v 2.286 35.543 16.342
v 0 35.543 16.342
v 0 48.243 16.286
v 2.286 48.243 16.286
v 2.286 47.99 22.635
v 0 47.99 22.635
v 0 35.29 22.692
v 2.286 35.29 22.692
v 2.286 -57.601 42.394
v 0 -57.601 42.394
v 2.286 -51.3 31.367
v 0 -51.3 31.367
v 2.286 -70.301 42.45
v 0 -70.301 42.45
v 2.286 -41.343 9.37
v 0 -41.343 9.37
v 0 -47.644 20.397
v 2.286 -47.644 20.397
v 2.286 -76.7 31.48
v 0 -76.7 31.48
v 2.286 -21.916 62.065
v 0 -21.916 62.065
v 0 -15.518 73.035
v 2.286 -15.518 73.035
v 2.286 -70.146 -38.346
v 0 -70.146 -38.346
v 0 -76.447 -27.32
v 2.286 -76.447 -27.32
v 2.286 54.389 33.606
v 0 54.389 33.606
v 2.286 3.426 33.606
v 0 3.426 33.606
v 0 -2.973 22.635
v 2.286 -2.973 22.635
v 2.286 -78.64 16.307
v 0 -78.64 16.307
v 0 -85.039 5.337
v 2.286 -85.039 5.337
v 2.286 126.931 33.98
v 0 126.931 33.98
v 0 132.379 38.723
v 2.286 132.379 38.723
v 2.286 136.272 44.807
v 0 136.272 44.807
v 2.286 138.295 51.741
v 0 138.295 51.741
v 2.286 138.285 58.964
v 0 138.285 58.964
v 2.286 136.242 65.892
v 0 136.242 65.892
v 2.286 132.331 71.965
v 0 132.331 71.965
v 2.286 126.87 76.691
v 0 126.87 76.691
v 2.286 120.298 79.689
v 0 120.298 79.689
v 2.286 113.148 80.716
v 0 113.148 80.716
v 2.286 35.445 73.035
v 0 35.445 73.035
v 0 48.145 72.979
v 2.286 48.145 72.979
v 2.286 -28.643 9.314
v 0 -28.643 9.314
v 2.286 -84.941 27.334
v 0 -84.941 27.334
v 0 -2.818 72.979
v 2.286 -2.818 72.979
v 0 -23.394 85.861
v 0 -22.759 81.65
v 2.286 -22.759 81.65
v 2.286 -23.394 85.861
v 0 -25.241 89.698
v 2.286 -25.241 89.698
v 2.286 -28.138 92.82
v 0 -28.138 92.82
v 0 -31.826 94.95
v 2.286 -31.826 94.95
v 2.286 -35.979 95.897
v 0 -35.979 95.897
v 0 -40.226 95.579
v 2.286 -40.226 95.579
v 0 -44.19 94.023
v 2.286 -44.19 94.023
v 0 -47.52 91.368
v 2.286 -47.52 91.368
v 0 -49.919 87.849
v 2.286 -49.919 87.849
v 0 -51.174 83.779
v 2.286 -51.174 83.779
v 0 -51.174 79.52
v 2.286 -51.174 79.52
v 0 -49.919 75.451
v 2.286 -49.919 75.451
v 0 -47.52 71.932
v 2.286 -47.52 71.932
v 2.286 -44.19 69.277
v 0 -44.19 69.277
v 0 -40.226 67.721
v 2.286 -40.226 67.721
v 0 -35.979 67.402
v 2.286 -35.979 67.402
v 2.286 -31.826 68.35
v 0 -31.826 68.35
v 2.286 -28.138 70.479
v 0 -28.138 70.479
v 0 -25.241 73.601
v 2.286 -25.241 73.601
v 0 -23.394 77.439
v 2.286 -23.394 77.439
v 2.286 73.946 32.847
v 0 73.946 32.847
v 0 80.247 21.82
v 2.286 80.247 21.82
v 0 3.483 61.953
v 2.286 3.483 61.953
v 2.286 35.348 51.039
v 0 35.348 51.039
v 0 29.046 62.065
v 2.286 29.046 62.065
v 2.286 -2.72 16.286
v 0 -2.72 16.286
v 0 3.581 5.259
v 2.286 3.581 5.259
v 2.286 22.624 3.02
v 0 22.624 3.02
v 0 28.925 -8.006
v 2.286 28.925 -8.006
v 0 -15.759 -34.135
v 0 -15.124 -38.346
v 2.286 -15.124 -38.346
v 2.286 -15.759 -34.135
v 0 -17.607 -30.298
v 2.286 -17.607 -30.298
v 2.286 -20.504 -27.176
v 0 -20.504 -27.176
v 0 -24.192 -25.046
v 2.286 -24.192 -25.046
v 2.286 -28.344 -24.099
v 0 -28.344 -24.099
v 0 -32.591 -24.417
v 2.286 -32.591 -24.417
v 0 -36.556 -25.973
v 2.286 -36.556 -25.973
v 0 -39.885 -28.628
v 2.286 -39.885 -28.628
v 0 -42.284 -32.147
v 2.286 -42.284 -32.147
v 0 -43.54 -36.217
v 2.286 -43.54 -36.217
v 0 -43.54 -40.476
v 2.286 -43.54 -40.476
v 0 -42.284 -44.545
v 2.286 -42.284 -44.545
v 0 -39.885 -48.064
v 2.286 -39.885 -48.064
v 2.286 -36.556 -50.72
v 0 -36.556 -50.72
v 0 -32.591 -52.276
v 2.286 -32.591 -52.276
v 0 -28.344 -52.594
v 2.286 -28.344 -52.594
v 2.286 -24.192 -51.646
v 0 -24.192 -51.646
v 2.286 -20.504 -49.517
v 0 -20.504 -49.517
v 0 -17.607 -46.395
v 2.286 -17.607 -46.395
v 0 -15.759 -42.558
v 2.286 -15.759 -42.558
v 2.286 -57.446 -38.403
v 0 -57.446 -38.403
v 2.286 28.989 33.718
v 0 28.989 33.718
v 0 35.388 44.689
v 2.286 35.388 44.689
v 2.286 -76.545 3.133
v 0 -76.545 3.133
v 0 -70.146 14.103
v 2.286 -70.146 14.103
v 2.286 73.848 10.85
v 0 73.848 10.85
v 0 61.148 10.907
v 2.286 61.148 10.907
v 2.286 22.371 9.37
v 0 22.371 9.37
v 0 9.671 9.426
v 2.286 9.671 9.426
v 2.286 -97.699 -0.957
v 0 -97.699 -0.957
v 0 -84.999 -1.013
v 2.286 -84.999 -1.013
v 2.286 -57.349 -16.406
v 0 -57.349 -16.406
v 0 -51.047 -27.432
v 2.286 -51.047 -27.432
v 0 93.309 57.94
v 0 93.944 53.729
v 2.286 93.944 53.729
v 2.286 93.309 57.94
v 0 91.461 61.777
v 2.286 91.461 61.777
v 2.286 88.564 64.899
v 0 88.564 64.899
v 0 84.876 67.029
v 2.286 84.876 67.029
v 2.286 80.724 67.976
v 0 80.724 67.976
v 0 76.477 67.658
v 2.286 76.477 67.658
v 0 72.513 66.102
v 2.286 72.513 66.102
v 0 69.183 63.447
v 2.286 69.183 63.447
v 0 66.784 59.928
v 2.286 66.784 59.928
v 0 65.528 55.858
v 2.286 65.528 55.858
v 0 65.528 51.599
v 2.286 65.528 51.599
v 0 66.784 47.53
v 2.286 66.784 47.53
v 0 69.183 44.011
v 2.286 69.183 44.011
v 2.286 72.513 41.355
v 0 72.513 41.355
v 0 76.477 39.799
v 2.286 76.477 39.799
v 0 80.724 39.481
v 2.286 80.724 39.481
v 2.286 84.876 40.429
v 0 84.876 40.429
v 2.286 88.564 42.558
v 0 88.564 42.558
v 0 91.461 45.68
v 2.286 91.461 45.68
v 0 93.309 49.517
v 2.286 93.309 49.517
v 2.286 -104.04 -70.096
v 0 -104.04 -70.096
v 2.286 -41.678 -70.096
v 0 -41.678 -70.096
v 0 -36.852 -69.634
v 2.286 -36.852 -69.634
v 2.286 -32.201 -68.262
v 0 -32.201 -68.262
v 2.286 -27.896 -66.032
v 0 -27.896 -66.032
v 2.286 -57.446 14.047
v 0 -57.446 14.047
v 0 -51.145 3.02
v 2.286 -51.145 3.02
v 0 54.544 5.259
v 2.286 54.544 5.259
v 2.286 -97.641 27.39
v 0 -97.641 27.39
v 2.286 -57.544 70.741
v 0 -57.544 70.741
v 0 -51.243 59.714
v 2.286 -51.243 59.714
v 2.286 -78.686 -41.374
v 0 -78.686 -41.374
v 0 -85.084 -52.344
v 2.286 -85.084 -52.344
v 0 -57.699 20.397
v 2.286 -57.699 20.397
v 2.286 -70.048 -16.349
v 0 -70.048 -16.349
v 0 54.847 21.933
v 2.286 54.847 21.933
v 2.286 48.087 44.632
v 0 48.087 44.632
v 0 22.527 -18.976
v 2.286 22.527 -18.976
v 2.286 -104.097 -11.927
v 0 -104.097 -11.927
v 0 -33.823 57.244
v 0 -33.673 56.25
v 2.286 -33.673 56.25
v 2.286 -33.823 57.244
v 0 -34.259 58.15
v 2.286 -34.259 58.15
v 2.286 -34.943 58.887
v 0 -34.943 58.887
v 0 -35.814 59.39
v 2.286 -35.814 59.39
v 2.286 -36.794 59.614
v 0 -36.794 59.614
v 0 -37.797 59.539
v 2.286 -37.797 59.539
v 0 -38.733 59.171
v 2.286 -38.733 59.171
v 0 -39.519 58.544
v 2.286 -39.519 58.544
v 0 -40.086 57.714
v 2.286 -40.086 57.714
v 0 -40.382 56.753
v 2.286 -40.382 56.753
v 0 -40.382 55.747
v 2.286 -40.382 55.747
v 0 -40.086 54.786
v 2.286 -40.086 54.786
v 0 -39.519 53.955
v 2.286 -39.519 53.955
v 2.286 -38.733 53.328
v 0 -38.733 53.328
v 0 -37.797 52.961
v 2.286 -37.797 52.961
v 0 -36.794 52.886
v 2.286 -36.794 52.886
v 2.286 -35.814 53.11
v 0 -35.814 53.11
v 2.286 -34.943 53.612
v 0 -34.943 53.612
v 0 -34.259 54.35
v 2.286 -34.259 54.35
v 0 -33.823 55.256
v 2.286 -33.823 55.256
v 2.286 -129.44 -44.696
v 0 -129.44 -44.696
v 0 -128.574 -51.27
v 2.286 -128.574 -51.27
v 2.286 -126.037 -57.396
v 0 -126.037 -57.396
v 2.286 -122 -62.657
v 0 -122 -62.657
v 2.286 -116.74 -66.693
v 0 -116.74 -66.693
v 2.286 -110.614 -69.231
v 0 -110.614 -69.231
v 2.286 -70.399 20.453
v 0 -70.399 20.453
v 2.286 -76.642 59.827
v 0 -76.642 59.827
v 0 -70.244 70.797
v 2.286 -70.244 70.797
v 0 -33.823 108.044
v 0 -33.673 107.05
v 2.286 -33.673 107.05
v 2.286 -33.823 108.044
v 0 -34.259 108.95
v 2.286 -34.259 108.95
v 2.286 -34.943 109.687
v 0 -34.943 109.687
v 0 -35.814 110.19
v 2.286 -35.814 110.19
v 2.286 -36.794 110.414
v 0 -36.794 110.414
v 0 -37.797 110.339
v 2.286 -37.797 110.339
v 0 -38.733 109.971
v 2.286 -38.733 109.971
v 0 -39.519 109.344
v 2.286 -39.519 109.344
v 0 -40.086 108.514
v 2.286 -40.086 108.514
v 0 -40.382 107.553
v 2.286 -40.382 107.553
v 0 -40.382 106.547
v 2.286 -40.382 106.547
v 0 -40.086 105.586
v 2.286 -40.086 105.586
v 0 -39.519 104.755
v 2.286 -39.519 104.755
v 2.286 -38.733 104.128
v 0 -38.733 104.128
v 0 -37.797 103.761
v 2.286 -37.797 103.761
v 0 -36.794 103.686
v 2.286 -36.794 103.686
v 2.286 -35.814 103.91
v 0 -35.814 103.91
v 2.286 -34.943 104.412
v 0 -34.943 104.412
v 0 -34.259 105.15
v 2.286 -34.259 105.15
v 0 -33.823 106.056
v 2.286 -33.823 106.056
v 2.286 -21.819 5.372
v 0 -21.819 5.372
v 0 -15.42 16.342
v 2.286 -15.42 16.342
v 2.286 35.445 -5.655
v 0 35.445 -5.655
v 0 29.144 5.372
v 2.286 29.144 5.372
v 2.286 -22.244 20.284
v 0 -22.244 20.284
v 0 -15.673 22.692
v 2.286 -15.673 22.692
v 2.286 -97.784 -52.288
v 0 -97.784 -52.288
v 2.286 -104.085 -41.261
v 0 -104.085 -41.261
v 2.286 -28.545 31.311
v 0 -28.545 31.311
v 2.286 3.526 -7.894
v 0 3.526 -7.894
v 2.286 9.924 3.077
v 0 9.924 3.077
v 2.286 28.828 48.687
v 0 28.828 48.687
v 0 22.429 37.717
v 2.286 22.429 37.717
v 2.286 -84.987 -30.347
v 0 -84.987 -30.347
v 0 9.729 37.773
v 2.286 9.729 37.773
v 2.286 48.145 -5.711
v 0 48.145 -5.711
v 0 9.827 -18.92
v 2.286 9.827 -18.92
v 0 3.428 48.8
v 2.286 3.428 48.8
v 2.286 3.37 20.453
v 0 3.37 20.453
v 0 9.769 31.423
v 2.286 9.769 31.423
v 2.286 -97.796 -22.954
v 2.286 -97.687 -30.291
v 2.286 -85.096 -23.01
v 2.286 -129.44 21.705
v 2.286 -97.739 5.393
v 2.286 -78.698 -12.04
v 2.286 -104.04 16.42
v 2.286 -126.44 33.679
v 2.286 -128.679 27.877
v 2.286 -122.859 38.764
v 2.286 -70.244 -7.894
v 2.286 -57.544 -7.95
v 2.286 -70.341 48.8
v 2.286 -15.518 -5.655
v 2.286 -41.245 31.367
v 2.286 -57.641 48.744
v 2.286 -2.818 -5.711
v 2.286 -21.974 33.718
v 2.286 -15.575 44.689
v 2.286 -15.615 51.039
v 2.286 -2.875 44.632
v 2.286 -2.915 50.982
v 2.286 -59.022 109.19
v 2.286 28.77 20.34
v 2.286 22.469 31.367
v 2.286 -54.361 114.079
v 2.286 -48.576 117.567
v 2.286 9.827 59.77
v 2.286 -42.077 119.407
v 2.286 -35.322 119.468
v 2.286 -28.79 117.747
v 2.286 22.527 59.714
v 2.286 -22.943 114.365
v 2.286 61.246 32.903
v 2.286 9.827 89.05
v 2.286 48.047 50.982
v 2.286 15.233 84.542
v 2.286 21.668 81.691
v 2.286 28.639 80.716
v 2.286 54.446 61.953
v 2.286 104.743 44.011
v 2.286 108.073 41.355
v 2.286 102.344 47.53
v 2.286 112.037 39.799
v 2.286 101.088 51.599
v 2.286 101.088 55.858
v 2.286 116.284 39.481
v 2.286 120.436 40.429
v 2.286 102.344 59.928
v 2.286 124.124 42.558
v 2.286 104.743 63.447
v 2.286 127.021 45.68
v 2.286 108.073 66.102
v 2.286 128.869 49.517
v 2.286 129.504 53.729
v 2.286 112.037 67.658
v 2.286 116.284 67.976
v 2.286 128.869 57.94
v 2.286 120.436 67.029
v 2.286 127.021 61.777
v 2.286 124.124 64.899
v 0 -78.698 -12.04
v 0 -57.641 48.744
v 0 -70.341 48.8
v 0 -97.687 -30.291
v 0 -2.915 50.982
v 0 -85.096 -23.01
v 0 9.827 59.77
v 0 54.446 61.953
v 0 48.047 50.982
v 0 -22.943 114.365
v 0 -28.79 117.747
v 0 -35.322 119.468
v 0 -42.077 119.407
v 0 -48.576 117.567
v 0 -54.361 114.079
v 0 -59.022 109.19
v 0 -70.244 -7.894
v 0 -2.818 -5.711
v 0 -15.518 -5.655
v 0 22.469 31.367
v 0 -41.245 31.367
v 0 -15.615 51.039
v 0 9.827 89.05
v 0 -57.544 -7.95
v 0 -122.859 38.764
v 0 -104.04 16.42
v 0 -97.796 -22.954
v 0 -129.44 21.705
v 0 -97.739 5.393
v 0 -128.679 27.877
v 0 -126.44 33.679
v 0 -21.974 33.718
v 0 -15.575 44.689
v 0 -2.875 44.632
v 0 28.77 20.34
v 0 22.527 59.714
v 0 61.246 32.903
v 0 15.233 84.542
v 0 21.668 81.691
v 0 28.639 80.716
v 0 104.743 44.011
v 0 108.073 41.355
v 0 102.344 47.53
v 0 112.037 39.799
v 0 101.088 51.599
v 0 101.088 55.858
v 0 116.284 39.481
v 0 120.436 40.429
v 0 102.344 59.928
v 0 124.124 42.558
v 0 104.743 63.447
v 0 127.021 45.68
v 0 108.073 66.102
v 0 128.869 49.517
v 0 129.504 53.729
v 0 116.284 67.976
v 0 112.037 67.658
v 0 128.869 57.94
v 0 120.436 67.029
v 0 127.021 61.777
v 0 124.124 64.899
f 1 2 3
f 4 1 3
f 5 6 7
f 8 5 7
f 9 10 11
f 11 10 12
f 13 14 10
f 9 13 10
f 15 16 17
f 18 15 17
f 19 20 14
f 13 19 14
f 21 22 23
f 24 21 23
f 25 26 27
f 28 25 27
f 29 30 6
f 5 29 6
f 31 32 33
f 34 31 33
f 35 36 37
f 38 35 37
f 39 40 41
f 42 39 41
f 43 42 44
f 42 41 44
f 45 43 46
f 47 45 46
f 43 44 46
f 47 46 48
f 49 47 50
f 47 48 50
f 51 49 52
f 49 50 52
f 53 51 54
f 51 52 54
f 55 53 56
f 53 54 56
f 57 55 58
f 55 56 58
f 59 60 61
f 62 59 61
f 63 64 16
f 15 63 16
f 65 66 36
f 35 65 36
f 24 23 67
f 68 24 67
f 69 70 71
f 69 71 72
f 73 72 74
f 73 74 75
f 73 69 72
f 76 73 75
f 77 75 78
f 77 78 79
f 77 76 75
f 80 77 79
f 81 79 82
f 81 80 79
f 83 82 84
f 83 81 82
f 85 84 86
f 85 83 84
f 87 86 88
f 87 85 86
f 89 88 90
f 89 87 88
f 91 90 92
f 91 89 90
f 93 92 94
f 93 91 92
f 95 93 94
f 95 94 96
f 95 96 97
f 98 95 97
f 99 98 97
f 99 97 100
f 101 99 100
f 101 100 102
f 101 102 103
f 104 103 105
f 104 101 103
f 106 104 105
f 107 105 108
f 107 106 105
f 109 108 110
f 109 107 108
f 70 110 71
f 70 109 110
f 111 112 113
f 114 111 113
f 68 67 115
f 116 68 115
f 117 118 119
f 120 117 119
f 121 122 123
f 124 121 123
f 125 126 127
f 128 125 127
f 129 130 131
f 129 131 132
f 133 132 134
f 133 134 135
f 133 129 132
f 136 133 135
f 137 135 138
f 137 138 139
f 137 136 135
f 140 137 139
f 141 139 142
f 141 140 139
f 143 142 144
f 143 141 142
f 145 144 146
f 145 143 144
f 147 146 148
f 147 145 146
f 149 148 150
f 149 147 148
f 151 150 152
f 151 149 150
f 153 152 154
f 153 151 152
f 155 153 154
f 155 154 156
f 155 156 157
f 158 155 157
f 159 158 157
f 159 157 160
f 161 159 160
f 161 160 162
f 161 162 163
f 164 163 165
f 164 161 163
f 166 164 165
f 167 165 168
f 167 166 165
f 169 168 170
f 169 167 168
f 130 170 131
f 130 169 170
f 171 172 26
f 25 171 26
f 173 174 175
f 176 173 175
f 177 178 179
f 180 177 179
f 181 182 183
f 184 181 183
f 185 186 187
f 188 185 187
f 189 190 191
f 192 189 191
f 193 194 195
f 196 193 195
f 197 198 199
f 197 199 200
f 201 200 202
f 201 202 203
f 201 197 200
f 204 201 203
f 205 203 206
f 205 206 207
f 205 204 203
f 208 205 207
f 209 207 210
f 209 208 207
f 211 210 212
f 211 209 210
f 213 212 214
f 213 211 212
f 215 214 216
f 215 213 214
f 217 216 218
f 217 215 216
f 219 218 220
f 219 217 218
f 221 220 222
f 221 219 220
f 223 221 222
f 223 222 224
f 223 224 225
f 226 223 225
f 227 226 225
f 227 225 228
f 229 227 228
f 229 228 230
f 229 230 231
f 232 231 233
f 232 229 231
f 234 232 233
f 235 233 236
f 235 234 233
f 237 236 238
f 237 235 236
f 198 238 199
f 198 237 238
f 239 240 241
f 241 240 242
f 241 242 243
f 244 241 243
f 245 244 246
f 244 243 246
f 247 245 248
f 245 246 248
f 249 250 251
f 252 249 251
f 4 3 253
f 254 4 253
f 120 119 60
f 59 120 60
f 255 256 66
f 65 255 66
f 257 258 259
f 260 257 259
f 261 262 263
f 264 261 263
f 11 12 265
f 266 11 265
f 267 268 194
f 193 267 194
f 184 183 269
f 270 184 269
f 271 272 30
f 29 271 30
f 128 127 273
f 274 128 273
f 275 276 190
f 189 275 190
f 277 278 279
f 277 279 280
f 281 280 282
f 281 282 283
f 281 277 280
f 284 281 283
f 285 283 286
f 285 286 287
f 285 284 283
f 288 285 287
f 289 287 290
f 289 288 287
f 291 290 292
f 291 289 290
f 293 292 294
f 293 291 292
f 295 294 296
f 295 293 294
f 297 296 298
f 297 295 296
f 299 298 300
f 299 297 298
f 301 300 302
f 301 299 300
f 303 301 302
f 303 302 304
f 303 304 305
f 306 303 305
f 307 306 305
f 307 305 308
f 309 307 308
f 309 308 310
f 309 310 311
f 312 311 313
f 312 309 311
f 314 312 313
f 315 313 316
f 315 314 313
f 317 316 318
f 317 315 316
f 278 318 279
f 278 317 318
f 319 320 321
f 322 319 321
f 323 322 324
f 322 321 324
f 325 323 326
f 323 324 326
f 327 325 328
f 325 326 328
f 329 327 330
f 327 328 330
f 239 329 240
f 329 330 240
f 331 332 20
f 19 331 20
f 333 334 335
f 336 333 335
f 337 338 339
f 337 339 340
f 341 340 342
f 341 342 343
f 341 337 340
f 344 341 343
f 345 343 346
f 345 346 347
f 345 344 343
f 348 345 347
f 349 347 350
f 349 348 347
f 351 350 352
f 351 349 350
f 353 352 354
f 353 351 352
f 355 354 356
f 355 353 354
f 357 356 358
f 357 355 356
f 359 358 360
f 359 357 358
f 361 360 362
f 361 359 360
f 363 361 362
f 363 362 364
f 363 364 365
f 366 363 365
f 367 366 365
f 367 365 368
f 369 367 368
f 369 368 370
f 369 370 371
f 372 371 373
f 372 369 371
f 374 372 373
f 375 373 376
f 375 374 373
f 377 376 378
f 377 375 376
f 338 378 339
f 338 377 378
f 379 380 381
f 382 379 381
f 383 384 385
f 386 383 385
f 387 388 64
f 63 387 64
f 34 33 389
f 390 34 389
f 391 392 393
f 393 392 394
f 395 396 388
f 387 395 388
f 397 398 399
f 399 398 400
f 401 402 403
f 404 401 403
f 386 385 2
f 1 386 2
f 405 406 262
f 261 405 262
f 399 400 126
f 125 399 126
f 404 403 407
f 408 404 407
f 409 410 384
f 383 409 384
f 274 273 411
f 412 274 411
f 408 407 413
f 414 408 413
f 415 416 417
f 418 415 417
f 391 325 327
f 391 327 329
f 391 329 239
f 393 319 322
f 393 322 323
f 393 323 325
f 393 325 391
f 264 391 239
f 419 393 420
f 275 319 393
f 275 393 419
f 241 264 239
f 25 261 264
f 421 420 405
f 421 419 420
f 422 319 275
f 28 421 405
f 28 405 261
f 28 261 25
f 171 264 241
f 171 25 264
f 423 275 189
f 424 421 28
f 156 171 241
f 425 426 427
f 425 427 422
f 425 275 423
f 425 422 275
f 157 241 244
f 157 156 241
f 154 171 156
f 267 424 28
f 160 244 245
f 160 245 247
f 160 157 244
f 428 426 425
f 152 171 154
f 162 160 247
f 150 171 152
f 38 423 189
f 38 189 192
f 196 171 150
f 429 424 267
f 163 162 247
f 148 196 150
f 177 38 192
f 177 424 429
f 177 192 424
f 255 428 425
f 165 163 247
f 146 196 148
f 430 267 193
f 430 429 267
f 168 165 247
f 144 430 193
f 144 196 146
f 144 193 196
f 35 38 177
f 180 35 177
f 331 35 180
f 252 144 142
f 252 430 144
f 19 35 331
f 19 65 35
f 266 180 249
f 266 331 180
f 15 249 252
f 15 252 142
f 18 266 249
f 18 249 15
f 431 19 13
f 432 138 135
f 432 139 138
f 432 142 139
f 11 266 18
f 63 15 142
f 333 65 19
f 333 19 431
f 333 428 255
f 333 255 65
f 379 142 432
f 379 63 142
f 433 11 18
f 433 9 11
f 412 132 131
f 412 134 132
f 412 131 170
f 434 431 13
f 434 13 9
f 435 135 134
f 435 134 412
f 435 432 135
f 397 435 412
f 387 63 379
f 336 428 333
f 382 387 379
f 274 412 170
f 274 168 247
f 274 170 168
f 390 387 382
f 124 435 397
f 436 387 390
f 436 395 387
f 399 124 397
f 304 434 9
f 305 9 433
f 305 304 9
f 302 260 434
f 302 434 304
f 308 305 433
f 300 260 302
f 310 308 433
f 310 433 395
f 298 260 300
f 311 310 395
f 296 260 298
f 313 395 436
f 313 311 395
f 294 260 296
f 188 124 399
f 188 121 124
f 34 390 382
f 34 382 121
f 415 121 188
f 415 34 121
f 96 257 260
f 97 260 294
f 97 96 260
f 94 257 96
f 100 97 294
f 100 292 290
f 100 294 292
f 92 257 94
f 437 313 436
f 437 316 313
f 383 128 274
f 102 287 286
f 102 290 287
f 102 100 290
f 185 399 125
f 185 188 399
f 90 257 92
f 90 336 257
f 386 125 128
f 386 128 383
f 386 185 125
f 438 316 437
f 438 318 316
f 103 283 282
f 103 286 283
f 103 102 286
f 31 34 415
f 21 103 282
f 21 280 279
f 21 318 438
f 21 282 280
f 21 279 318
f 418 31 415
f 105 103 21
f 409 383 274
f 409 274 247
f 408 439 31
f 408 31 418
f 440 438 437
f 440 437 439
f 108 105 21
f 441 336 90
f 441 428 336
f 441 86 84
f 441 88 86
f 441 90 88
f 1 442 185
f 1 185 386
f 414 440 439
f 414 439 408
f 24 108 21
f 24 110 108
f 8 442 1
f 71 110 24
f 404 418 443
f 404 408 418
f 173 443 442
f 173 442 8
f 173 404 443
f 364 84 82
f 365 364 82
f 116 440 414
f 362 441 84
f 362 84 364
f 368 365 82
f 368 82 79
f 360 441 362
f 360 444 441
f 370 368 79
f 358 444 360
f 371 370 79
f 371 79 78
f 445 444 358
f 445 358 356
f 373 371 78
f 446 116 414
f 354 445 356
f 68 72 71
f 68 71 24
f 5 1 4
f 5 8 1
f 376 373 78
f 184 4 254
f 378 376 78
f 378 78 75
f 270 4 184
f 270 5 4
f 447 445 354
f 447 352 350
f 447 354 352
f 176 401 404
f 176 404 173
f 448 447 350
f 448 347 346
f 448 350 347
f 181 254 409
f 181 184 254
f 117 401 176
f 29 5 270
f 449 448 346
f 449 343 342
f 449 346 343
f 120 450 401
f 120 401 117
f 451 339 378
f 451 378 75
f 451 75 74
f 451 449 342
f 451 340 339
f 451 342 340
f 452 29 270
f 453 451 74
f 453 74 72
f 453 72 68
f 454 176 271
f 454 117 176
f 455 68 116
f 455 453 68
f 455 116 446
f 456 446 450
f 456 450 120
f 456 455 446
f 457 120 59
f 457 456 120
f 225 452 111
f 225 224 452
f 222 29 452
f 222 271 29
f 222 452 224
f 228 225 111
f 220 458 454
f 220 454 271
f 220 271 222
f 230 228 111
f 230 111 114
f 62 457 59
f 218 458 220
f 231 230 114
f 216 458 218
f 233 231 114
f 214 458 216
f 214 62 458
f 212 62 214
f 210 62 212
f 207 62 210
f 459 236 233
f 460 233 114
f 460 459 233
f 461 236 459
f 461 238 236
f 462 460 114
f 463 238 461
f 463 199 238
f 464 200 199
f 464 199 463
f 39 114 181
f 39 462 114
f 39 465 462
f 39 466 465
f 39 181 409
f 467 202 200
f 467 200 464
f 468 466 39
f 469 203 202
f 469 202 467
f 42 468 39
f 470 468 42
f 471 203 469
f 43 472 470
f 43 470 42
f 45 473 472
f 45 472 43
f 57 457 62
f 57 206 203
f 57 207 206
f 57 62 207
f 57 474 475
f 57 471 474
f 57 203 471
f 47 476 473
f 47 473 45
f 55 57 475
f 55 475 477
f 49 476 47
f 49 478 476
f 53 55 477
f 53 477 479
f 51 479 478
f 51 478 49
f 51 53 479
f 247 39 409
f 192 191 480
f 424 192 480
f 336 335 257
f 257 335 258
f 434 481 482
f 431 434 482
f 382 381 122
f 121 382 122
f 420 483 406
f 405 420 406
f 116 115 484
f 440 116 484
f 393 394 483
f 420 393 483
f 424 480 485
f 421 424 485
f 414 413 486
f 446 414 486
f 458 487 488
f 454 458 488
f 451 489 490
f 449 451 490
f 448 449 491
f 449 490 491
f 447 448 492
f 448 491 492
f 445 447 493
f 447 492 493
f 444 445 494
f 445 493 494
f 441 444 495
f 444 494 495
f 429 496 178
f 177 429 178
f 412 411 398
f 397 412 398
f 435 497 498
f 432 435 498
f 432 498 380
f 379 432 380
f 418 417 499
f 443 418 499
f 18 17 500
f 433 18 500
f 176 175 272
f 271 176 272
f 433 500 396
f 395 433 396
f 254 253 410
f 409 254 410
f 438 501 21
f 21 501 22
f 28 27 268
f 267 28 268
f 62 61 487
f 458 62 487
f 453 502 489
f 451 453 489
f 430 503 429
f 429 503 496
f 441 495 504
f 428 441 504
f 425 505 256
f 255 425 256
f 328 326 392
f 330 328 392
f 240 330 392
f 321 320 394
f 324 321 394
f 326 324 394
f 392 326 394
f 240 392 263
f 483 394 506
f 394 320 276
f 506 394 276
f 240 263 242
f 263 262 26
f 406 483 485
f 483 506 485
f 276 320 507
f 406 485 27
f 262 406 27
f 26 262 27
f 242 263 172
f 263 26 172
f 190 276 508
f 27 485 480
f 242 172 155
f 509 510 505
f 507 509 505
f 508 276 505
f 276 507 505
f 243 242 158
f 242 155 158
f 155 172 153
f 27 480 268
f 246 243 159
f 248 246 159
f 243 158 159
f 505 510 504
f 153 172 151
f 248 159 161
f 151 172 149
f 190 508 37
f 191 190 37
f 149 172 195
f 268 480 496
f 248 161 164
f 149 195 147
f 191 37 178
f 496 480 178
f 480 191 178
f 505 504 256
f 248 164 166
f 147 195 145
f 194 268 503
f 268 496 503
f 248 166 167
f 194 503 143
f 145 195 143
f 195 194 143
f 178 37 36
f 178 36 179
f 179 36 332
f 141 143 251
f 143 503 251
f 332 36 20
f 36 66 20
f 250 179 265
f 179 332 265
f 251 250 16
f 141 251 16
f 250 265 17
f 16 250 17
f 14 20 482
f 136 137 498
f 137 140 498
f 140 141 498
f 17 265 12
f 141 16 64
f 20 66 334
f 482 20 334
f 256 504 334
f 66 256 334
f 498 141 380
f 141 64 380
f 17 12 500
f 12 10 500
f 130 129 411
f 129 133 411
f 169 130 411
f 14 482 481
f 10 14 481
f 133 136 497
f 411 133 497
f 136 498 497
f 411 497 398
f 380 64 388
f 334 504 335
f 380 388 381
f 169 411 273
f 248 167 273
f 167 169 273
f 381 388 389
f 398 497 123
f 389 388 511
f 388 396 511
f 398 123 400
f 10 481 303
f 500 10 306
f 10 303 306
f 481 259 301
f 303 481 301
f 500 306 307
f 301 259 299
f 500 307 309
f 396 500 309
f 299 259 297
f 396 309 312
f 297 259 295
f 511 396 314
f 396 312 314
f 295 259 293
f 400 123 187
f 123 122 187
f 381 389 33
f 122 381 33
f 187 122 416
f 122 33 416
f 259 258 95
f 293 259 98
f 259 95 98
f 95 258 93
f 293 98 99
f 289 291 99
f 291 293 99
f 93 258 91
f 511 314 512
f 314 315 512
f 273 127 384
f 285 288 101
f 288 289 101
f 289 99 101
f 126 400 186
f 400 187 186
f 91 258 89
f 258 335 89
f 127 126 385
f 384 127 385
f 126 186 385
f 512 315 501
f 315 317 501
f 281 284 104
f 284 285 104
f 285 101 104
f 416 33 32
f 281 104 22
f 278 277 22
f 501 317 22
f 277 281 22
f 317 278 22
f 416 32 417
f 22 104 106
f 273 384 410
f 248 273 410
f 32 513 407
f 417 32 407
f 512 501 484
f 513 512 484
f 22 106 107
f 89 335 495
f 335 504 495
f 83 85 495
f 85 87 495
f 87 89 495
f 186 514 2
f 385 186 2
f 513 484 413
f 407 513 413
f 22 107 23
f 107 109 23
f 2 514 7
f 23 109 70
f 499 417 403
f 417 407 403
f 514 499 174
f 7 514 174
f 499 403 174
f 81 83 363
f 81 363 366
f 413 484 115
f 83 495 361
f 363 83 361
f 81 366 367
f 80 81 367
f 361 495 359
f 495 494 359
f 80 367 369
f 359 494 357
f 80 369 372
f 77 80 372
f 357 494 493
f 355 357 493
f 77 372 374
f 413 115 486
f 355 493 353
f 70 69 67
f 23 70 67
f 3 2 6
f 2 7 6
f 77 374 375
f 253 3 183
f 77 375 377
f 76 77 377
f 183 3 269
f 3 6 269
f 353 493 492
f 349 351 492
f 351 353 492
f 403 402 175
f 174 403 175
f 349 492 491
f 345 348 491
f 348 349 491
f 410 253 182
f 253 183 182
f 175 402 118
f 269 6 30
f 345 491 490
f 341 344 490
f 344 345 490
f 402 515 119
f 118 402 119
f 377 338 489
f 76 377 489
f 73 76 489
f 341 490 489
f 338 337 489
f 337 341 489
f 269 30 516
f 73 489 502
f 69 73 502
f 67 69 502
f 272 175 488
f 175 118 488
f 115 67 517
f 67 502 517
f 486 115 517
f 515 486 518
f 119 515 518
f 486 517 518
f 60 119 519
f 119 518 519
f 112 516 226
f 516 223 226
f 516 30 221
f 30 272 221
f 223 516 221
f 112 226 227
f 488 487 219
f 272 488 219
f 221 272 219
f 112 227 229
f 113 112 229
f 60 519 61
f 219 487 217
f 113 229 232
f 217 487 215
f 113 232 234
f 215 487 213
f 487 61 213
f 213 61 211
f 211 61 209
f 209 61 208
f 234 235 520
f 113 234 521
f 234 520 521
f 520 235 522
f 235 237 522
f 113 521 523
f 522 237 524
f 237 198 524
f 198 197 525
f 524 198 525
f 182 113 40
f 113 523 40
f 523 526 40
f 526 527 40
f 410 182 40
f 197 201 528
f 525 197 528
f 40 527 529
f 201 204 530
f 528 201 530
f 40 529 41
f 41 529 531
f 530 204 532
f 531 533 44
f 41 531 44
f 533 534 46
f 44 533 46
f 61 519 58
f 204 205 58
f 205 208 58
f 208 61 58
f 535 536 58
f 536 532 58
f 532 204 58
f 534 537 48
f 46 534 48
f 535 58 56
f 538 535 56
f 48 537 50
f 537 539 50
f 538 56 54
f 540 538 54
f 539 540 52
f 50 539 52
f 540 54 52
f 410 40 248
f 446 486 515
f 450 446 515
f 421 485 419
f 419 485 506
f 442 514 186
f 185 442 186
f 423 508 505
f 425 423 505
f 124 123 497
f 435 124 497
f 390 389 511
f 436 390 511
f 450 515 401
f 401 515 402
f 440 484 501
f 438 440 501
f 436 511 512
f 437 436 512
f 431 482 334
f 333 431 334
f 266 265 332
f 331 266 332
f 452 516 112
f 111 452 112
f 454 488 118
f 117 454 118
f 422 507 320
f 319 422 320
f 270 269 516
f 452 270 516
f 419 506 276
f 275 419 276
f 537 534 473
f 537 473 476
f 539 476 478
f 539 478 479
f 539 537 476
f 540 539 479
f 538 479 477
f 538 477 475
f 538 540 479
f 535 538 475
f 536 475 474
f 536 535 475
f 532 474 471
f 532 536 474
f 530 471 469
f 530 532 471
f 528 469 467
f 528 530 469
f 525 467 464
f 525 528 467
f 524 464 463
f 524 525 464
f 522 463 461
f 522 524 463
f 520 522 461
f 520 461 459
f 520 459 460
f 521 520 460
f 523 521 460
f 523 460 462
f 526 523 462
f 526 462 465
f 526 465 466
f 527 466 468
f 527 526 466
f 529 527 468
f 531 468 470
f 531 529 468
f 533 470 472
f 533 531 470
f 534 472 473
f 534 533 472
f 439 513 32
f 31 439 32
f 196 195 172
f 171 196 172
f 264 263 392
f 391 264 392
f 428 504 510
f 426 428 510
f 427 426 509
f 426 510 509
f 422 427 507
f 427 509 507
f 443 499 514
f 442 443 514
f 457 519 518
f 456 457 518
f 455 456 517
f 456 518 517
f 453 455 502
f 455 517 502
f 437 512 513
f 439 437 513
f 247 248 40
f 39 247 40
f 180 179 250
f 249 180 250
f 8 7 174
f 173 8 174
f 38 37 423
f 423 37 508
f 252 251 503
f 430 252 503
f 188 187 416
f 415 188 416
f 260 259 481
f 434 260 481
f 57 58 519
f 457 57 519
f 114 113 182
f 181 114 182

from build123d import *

# Parameters (mm, degrees)
F0_R     = 14.2875
F0_R_2   = 3.373438
F1_DEPTH = 2.286


with BuildPart() as f1:
    # F0 (on Right) → F1 (new body)
    with BuildSketch(Plane.YZ):
        with BuildLine():
            ThreePointArc((-41.678018, -70.096295), (-34.493562, -69.059045), (-27.895884, -66.032011))
            Line((-27.895884, -66.032011), (126.930524, 33.980489))
            ThreePointArc((126.930524, 33.980489), (137.51114, 62.500661), (113.14839, 80.716205))
            Line((113.14839, 80.716205), (28.638652, 80.716205))
            ThreePointArc((28.638652, 80.716205), (18.351058, 82.892825), (9.826628, 89.049637))
            Line((9.826628, 89.049637), (-22.94285, 114.364516))
            ThreePointArc((-22.94285, 114.364516), (-42.076779, 119.406552), (-59.022421, 109.190164))
            Line((-59.022421, 109.190164), (-122.859185, 38.763636))
            ThreePointArc((-122.859185, 38.763636), (-127.737616, 30.847053), (-129.439808, 21.705176))
            Line((-129.439808, 21.705176), (-129.439808, -44.696295))
            ThreePointArc((-129.439808, -44.696295), (-122.000321, -62.656807), (-104.039808, -70.096295))
            Line((-104.039808, -70.096295), (-41.678018, -70.096295))
        make_face()
        Polygon((-85.084374, -52.344054), (-97.784249, -52.287691), (-104.085375, -41.261095), (-97.686626, -30.290862), (-84.986751, -30.347225), (-78.685625, -41.373821), align=None, mode=Mode.SUBTRACT)
        Polygon((-57.446231, -38.402657), (-70.146106, -38.346295), (-76.447232, -27.319699), (-70.048483, -16.349466), (-57.348608, -16.405829), (-51.047482, -27.432424), align=None, mode=Mode.SUBTRACT)
        with Locations((-29.411834, -38.346295)):
            Circle(F0_R, mode=Mode.SUBTRACT)
        Polygon((-85.096416, -23.010039), (-97.796291, -22.953676), (-104.097417, -11.927081), (-97.698668, -0.956848), (-84.998793, -1.01321), (-78.697667, -12.039806), align=None, mode=Mode.SUBTRACT)
        Polygon((-57.543857, -7.94989), (-70.243732, -7.893527), (-76.544858, 3.133069), (-70.146109, 14.103302), (-57.446234, 14.046939), (-51.145108, 3.020343), align=None, mode=Mode.SUBTRACT)
        Polygon((-85.038808, 5.336948), (-97.738683, 5.393311), (-104.039808, 16.419906), (-97.641059, 27.390139), (-84.941185, 27.333776), (-78.640059, 16.307181), align=None, mode=Mode.SUBTRACT)
        Polygon((-28.643053, 9.313772), (-41.342928, 9.370135), (-47.644054, 20.396731), (-41.245305, 31.366964), (-28.54543, 31.310601), (-22.244304, 20.284005), align=None, mode=Mode.SUBTRACT)
        Polygon((-2.817801, -5.711303), (-15.517676, -5.65494), (-21.818802, 5.371655), (-15.420052, 16.341888), (-2.720178, 16.285526), (3.580948, 5.25893), align=None, mode=Mode.SUBTRACT)
        Polygon((22.526503, -18.976484), (9.826628, -18.920122), (3.525502, -7.893526), (9.924251, 3.076707), (22.624126, 3.020344), (28.925252, -8.006251), align=None, mode=Mode.SUBTRACT)
        Polygon((22.371272, 9.370136), (9.671397, 9.426499), (3.370271, 20.453094), (9.76902, 31.423327), (22.468895, 31.366965), (28.770021, 20.340369), align=None, mode=Mode.SUBTRACT)
        Polygon((48.145067, -5.711305), (35.445192, -5.654942), (29.144066, 5.371654), (35.542815, 16.341887), (48.24269, 16.285524), (54.543816, 5.258928), align=None, mode=Mode.SUBTRACT)
        Polygon((73.847689, 10.850061), (61.147815, 10.906608), (54.84685, 21.933296), (61.245758, 32.903436), (73.945632, 32.846888), (80.246598, 21.820201), align=None, mode=Mode.SUBTRACT)
        Polygon((-57.699089, 20.396731), (-70.398963, 20.453093), (-76.700089, 31.479689), (-70.30134, 42.449922), (-57.601465, 42.393559), (-51.30034, 31.366964), align=None, mode=Mode.SUBTRACT)
        Polygon((-57.641481, 48.743717), (-70.341355, 48.80008), (-76.642481, 59.826676), (-70.243732, 70.796909), (-57.543857, 70.740546), (-51.242732, 59.71395), align=None, mode=Mode.SUBTRACT)
        Polygon((-2.973032, 22.635317), (-15.672907, 22.69168), (-21.974033, 33.718276), (-15.575284, 44.688509), (-2.875409, 44.632146), (3.425717, 33.60555), align=None, mode=Mode.SUBTRACT)
        with Locations((-37.046294, 56.249909)):
            Circle(F0_R_2, mode=Mode.SUBTRACT)
        Polygon((-2.915424, 50.982304), (-15.615299, 51.038667), (-21.916425, 62.065262), (-15.517676, 73.035495), (-2.817801, 72.979133), (3.483325, 61.952537), align=None, mode=Mode.SUBTRACT)
        with Locations((-37.046294, 81.649909)):
            Circle(F0_R, mode=Mode.SUBTRACT)
        with Locations((-37.046294, 107.049909)):
            Circle(F0_R_2, mode=Mode.SUBTRACT)
        Polygon((47.989836, 22.635315), (35.289961, 22.691678), (28.988835, 33.718274), (35.387584, 44.688507), (48.087459, 44.632144), (54.388585, 33.605548), align=None, mode=Mode.SUBTRACT)
        Polygon((22.42888, 37.717123), (9.729005, 37.773485), (3.427879, 48.800081), (9.826628, 59.770314), (22.526503, 59.713951), (28.827629, 48.687356), align=None, mode=Mode.SUBTRACT)
        Polygon((48.047444, 50.982302), (35.347569, 51.038665), (29.046443, 62.065261), (35.445192, 73.035494), (48.145067, 72.979131), (54.446193, 61.952535), align=None, mode=Mode.SUBTRACT)
        with Locations((79.656299, 53.728705)):
            Circle(F0_R, mode=Mode.SUBTRACT)
        with Locations((115.216299, 53.728705)):
            Circle(F0_R, mode=Mode.SUBTRACT)
    extrude(amount=F1_DEPTH)


solid = f1.part
